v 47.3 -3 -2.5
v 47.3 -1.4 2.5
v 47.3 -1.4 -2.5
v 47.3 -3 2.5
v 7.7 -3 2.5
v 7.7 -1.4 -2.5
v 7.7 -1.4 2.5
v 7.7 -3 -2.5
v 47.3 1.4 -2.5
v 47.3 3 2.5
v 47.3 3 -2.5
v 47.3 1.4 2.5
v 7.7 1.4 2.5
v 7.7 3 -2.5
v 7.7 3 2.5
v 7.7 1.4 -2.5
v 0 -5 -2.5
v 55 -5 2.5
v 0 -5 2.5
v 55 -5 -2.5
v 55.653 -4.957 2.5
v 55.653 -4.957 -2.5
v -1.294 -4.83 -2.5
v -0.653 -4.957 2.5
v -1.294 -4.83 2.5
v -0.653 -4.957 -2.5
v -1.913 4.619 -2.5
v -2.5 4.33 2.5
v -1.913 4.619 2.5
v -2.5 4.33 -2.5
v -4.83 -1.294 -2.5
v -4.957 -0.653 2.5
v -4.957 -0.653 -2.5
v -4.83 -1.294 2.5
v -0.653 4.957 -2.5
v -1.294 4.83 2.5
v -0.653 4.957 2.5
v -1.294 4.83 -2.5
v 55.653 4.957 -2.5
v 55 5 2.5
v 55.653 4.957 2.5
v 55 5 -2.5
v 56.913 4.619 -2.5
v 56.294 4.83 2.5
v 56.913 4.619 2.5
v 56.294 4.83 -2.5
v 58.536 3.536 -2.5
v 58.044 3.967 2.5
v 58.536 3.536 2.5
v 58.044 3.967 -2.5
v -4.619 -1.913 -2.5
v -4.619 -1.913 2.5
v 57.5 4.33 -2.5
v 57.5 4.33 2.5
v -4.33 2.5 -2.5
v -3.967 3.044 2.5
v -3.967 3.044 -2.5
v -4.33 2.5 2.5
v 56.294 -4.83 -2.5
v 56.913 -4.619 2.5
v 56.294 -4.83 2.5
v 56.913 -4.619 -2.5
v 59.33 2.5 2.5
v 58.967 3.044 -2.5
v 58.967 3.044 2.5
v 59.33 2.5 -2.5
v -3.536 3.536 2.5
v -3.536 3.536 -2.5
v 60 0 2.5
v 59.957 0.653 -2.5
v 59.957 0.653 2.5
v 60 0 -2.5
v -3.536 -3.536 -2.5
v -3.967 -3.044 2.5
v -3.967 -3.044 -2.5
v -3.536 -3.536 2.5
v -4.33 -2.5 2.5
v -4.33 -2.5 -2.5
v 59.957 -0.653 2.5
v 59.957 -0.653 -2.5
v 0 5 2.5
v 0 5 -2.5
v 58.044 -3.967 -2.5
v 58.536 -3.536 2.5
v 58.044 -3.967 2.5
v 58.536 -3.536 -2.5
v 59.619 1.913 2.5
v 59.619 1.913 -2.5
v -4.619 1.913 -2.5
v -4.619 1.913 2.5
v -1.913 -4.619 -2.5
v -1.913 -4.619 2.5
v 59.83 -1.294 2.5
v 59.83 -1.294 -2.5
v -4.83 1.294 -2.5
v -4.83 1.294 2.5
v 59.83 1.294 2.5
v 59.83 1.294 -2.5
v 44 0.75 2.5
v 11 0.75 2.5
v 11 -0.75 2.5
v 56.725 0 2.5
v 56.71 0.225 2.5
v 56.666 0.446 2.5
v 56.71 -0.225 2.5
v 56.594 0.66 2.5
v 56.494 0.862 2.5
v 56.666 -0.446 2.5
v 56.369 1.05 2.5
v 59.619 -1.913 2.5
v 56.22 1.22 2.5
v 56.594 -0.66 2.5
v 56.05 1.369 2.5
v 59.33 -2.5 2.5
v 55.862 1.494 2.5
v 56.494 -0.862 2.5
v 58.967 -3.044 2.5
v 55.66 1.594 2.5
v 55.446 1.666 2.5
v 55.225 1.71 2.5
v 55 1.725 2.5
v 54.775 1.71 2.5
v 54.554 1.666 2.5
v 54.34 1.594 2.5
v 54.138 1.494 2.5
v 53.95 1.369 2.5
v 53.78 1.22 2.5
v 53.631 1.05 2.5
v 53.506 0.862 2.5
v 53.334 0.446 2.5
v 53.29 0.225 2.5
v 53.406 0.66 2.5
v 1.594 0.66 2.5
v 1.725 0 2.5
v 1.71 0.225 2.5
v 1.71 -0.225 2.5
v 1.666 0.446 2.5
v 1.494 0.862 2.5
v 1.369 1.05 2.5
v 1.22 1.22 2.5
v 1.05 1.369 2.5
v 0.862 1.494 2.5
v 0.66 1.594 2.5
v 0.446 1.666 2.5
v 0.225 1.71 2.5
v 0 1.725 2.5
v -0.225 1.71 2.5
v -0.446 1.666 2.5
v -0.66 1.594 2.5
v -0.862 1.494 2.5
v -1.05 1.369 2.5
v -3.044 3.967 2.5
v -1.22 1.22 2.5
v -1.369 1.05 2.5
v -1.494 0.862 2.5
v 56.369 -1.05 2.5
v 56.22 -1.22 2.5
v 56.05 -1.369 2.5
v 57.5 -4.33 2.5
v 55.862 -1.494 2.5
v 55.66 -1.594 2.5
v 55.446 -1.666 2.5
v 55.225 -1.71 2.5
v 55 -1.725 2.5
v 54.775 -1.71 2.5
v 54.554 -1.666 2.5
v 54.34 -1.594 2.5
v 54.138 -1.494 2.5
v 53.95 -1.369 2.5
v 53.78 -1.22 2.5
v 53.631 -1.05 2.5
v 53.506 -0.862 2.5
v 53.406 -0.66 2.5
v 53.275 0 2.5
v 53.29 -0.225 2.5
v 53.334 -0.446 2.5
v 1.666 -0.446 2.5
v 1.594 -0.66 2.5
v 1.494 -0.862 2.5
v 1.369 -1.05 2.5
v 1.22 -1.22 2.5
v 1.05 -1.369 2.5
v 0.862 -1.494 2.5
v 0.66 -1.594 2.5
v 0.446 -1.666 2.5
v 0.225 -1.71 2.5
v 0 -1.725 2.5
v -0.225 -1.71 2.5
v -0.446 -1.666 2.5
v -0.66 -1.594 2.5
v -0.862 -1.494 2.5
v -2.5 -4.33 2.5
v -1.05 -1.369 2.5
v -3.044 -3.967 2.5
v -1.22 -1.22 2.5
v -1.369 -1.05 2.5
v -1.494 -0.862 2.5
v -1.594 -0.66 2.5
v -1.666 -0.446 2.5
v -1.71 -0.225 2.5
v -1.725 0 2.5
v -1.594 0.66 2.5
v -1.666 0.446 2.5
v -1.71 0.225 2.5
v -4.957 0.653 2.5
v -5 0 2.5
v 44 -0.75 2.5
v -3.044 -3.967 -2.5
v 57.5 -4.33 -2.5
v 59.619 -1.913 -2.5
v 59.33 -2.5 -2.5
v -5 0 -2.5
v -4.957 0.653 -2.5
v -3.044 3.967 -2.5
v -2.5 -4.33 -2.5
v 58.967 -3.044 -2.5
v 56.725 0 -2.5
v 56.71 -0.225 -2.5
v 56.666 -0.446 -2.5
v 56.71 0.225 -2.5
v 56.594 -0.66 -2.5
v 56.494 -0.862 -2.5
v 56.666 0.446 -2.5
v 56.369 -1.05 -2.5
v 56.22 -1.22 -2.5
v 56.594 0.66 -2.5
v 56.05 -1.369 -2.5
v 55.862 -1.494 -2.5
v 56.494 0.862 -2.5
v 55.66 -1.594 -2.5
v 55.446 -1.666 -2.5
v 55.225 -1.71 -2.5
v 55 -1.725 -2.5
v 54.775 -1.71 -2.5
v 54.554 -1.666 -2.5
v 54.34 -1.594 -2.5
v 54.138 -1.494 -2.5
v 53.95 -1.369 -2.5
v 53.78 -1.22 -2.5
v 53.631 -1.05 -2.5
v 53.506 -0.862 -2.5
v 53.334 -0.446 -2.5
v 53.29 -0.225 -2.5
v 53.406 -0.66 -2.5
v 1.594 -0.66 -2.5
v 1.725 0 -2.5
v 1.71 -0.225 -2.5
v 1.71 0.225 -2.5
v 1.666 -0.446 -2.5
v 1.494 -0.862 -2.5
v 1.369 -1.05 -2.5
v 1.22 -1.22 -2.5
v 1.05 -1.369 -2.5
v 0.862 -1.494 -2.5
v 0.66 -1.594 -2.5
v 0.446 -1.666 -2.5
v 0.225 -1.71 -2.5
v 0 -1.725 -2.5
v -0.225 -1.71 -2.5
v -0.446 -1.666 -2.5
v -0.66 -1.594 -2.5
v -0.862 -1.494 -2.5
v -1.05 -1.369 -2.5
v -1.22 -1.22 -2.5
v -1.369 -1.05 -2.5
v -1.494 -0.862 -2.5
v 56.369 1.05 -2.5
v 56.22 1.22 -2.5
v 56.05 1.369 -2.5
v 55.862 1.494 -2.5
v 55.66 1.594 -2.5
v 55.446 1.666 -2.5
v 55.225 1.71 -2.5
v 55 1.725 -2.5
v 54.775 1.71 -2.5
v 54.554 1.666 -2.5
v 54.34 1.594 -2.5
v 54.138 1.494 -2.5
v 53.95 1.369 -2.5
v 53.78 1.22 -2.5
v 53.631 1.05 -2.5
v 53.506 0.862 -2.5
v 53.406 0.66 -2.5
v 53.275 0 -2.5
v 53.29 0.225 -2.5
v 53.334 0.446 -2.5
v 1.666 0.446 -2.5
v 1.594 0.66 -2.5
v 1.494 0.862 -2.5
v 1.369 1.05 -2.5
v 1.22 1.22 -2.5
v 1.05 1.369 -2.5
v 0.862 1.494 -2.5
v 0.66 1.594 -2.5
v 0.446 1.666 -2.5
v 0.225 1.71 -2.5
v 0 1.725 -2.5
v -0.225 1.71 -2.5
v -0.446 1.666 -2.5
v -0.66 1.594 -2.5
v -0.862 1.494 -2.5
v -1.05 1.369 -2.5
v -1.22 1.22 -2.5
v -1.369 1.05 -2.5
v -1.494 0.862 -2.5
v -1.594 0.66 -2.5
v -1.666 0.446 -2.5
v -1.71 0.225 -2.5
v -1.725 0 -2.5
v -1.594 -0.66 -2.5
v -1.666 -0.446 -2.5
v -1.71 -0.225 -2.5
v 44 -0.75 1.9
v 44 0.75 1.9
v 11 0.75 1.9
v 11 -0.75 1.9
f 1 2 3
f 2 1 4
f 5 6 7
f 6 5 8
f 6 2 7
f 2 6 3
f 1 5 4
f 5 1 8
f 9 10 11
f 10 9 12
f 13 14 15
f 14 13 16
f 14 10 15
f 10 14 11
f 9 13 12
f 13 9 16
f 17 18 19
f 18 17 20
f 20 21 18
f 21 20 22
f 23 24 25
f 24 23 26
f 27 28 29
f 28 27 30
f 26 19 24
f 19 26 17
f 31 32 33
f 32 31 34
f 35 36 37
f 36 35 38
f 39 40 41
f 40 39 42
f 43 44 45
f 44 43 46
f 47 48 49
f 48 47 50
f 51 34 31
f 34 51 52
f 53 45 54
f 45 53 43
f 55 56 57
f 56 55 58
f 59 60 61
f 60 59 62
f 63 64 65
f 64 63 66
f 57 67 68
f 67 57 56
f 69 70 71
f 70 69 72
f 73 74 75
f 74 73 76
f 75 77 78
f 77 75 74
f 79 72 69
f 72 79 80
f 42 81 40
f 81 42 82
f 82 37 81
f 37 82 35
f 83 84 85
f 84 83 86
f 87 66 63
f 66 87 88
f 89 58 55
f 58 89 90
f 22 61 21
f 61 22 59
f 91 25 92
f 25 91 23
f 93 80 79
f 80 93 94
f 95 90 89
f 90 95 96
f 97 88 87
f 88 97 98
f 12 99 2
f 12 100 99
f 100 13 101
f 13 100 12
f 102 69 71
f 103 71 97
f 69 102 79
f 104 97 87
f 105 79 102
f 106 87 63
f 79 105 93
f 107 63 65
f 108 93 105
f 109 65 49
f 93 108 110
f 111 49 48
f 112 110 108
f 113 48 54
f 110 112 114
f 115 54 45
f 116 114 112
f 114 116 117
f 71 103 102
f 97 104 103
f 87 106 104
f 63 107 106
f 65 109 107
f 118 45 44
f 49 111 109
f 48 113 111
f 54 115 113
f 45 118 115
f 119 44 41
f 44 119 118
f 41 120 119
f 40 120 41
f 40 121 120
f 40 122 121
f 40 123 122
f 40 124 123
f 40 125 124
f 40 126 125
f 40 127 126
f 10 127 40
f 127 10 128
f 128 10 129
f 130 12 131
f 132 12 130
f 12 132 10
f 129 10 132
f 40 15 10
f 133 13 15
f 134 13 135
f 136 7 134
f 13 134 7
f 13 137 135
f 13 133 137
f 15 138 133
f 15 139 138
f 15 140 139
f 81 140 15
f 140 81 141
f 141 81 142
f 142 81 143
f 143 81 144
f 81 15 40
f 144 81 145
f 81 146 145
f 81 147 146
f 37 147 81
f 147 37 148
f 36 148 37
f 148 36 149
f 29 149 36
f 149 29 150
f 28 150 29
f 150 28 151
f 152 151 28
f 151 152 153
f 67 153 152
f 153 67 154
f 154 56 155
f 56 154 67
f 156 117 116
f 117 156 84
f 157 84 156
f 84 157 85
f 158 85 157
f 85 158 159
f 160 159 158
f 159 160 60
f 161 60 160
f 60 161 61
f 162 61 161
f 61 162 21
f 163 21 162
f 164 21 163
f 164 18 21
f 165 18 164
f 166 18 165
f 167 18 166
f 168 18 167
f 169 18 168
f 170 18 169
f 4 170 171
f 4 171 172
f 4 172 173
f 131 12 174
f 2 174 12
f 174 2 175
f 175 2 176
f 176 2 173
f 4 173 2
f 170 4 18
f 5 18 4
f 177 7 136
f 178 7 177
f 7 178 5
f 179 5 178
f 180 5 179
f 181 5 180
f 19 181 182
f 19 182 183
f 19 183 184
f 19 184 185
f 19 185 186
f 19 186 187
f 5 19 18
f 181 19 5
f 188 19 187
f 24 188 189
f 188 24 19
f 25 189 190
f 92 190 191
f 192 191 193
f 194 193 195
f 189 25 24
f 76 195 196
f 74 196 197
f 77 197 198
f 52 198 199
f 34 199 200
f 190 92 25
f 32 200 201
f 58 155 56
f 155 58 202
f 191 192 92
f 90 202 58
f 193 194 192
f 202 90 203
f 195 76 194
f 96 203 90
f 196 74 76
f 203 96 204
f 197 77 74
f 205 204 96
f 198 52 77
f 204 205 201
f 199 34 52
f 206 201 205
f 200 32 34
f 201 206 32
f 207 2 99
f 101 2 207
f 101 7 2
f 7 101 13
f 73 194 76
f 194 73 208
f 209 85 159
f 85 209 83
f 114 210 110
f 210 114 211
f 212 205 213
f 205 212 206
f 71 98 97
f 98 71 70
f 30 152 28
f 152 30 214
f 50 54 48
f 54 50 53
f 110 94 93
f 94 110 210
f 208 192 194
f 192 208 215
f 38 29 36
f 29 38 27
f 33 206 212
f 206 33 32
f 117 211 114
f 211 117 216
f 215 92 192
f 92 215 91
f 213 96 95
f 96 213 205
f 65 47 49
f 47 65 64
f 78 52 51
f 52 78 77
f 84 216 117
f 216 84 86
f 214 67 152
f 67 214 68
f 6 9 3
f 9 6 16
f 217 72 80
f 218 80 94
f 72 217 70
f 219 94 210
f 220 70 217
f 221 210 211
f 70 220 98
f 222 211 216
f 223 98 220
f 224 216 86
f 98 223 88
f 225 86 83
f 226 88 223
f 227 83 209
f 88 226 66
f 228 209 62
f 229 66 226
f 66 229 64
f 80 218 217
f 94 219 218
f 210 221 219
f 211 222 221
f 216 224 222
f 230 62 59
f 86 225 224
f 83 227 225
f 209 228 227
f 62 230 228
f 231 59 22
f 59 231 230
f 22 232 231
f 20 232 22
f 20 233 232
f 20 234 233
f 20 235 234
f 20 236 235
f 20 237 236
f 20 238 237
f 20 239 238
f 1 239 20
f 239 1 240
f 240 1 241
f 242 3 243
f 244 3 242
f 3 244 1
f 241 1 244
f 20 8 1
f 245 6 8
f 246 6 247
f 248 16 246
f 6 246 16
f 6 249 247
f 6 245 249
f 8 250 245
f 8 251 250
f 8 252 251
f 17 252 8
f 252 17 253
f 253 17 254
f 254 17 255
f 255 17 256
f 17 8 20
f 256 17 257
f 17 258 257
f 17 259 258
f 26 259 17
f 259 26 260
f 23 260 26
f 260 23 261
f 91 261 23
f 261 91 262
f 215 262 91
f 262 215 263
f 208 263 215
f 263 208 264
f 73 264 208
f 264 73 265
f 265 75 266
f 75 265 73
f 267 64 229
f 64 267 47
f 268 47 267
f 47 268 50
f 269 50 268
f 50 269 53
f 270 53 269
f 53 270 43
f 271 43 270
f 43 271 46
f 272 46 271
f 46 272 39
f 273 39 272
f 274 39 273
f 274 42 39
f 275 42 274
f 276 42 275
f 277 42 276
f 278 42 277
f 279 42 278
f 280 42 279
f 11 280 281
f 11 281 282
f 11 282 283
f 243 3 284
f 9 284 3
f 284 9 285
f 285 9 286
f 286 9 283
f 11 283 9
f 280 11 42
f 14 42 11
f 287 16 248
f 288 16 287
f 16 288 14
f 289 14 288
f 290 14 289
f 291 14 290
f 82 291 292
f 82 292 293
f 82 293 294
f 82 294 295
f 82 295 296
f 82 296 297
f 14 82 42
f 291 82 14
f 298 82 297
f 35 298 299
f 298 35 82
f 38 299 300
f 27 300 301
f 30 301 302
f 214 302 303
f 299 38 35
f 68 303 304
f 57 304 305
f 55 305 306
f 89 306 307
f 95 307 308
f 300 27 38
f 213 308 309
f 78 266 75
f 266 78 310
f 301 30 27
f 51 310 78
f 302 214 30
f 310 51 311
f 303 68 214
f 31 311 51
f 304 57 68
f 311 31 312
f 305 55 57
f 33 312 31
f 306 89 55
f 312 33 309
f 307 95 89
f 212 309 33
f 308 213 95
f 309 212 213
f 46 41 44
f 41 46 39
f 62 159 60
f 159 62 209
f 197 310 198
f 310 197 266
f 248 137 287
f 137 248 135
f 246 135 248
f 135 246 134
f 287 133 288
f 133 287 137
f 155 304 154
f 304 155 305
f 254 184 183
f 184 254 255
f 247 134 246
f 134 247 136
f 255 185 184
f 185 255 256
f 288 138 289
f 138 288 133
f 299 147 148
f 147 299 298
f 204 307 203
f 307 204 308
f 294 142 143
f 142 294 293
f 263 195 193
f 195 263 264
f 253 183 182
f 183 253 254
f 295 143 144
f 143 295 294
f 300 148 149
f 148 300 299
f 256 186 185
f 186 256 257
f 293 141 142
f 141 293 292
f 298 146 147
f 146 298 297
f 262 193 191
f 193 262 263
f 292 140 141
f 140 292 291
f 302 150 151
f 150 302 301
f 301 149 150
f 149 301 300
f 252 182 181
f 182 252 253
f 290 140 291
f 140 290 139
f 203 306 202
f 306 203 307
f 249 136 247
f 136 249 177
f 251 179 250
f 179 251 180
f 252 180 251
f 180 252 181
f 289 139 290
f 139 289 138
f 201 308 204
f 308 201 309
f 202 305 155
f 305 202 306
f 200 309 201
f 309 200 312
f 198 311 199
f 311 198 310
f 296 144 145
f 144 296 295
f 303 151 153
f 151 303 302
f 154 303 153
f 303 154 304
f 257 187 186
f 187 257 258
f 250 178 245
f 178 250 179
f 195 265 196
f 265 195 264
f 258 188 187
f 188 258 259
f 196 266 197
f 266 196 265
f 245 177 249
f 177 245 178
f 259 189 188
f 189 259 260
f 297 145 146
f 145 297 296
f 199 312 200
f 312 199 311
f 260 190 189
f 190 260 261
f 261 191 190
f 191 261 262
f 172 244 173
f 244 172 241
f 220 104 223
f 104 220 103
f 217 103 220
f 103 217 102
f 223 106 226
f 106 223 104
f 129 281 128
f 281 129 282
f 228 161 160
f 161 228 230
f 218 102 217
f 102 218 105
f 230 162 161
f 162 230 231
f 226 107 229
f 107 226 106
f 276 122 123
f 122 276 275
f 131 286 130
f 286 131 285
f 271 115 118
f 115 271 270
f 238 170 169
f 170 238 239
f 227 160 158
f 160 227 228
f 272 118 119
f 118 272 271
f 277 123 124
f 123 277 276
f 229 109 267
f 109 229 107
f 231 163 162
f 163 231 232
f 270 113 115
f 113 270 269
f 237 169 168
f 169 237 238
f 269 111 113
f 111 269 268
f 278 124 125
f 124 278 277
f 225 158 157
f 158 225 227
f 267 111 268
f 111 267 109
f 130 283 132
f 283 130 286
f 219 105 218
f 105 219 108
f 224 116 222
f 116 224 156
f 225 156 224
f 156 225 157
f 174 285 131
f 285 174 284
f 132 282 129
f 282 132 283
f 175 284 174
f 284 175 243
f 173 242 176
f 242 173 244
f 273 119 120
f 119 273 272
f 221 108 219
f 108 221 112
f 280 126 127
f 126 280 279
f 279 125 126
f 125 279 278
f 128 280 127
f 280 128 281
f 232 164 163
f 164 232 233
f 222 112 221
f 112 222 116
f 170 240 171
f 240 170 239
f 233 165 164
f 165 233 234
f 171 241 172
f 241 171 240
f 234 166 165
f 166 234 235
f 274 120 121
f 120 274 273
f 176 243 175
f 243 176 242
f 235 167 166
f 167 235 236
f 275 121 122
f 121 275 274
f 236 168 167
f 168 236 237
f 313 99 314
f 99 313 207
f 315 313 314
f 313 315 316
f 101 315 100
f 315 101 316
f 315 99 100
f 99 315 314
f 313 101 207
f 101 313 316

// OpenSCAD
// file: ../params.scad
// Vexamicus T0/T1 parametric dimensions (mm)
// Inspired by published Salto-class proportions — original geometry, not a CAD clone.

/* [Scale] */
// Overall linear scale vs nominal T1 (1.0 ≈ 240 mm body height class)
SCALE = 1.0;

/* [Body] */
BODY_W = 42 * SCALE;      // Y width
BODY_H = 38 * SCALE;      // Z height of core block
BODY_L = 55 * SCALE;      // X length
WALL = 2.4 * SCALE;
BATTERY_L = 48 * SCALE;
BATTERY_W = 18 * SCALE;
BATTERY_H = 14 * SCALE;

/* [Leg 4-bar] */
HIP_Z = -8 * SCALE;                 // hip joint below body center
FEMUR_L = 55 * SCALE;               // hip → knee
SHIN_L = 70 * SCALE;                // knee → foot
COUPLER_L = 48 * SCALE;             // parallel coupler
CRANK_L = 18 * SCALE;               // SEA output crank
LEG_THICK = 5 * SCALE;
LEG_WIDTH = 8 * SCALE;
BEARING_ID = 3.2;                   // M3 clearance
BEARING_OD = 10.0;                  // 623-ish pocket (simplified)

/* [Foot] */
TOE_R = 12 * SCALE;
ANKLE_PAD_H = 6 * SCALE;

/* [SEA hub] */
SEA_HUB_R = 16 * SCALE;
SEA_HUB_H = 12 * SCALE;
MOTOR_BORE = 5.2;                   // typical BLDC shaft
SPRING_SLOT_W = 4.5 * SCALE;

/* [Tail / reaction wheel] */
TAIL_BOOM_L = 35 * SCALE;
TAIL_WHEEL_R = 28 * SCALE;
TAIL_WHEEL_H = 8 * SCALE;
TAIL_SHAFT = 3.2;

/* [Thruster booms T2] */
THRUST_BOOM_L = 45 * SCALE;
THRUST_ARM_ROLL = 40 * SCALE;       // ~ half of Salto 80mm moment arm at SCALE~1
THRUST_MOTOR_R = 6 * SCALE;

/* [Clearance / print] */
CLEAR = 0.25;
$fn = 48;

function mm(x) = x;
// file: ../vitamins.scad
// Shared primitives
include <params.scad>

module round_rect(size, r=1.5, center=false) {
    // size = [x,y,z]
    x=size[0]; y=size[1]; z=size[2];
    translate(center ? [-x/2,-y/2,-z/2] : [0,0,0])
    minkowski() {
        cube([max(0.01,x-2*r), max(0.01,y-2*r), max(0.01,z)], center=false);
        cylinder(r=r, h=0.01, center=false);
    }
}

module bearing_pocket(h=LEG_THICK+0.2) {
    cylinder(d=BEARING_OD + CLEAR, h=h, center=true);
}

module bolt_hole(d=BEARING_ID, h=40) {
    cylinder(d=d + CLEAR, h=h, center=true);
}

module carbon_tube(L=50, od=4, id=3) {
    difference() {
        cylinder(d=od, h=L, center=true);
        cylinder(d=id, h=L+1, center=true);
    }
}

module motor_standoff_pattern(spacing=16, h=6, d=2.2) {
    for (a=[0:90:270])
        rotate([0,0,a]) translate([spacing/2,0,0])
            cylinder(d=d, h=h, center=true);
}
// main file
// Femur link (hip → knee)
include <../vitamins.scad>

module femur() {
    L = FEMUR_L;
    difference() {
        hull() {
            cylinder(d=LEG_WIDTH+2, h=LEG_THICK, center=true);
            translate([L,0,0]) cylinder(d=LEG_WIDTH+2, h=LEG_THICK, center=true);
        }
        // I-beam cutouts
        for (s=[-1,1])
            translate([L/2, s*2.2, 0])
                cube([L*0.72, 1.6, LEG_THICK+1], center=true);
        bolt_hole();
        translate([L,0,0]) bolt_hole();
        // cable groove
        translate([L/2, 0, LEG_THICK/2])
            cube([L*0.6, 1.5, 1.2], center=true);
    }
}

femur();
